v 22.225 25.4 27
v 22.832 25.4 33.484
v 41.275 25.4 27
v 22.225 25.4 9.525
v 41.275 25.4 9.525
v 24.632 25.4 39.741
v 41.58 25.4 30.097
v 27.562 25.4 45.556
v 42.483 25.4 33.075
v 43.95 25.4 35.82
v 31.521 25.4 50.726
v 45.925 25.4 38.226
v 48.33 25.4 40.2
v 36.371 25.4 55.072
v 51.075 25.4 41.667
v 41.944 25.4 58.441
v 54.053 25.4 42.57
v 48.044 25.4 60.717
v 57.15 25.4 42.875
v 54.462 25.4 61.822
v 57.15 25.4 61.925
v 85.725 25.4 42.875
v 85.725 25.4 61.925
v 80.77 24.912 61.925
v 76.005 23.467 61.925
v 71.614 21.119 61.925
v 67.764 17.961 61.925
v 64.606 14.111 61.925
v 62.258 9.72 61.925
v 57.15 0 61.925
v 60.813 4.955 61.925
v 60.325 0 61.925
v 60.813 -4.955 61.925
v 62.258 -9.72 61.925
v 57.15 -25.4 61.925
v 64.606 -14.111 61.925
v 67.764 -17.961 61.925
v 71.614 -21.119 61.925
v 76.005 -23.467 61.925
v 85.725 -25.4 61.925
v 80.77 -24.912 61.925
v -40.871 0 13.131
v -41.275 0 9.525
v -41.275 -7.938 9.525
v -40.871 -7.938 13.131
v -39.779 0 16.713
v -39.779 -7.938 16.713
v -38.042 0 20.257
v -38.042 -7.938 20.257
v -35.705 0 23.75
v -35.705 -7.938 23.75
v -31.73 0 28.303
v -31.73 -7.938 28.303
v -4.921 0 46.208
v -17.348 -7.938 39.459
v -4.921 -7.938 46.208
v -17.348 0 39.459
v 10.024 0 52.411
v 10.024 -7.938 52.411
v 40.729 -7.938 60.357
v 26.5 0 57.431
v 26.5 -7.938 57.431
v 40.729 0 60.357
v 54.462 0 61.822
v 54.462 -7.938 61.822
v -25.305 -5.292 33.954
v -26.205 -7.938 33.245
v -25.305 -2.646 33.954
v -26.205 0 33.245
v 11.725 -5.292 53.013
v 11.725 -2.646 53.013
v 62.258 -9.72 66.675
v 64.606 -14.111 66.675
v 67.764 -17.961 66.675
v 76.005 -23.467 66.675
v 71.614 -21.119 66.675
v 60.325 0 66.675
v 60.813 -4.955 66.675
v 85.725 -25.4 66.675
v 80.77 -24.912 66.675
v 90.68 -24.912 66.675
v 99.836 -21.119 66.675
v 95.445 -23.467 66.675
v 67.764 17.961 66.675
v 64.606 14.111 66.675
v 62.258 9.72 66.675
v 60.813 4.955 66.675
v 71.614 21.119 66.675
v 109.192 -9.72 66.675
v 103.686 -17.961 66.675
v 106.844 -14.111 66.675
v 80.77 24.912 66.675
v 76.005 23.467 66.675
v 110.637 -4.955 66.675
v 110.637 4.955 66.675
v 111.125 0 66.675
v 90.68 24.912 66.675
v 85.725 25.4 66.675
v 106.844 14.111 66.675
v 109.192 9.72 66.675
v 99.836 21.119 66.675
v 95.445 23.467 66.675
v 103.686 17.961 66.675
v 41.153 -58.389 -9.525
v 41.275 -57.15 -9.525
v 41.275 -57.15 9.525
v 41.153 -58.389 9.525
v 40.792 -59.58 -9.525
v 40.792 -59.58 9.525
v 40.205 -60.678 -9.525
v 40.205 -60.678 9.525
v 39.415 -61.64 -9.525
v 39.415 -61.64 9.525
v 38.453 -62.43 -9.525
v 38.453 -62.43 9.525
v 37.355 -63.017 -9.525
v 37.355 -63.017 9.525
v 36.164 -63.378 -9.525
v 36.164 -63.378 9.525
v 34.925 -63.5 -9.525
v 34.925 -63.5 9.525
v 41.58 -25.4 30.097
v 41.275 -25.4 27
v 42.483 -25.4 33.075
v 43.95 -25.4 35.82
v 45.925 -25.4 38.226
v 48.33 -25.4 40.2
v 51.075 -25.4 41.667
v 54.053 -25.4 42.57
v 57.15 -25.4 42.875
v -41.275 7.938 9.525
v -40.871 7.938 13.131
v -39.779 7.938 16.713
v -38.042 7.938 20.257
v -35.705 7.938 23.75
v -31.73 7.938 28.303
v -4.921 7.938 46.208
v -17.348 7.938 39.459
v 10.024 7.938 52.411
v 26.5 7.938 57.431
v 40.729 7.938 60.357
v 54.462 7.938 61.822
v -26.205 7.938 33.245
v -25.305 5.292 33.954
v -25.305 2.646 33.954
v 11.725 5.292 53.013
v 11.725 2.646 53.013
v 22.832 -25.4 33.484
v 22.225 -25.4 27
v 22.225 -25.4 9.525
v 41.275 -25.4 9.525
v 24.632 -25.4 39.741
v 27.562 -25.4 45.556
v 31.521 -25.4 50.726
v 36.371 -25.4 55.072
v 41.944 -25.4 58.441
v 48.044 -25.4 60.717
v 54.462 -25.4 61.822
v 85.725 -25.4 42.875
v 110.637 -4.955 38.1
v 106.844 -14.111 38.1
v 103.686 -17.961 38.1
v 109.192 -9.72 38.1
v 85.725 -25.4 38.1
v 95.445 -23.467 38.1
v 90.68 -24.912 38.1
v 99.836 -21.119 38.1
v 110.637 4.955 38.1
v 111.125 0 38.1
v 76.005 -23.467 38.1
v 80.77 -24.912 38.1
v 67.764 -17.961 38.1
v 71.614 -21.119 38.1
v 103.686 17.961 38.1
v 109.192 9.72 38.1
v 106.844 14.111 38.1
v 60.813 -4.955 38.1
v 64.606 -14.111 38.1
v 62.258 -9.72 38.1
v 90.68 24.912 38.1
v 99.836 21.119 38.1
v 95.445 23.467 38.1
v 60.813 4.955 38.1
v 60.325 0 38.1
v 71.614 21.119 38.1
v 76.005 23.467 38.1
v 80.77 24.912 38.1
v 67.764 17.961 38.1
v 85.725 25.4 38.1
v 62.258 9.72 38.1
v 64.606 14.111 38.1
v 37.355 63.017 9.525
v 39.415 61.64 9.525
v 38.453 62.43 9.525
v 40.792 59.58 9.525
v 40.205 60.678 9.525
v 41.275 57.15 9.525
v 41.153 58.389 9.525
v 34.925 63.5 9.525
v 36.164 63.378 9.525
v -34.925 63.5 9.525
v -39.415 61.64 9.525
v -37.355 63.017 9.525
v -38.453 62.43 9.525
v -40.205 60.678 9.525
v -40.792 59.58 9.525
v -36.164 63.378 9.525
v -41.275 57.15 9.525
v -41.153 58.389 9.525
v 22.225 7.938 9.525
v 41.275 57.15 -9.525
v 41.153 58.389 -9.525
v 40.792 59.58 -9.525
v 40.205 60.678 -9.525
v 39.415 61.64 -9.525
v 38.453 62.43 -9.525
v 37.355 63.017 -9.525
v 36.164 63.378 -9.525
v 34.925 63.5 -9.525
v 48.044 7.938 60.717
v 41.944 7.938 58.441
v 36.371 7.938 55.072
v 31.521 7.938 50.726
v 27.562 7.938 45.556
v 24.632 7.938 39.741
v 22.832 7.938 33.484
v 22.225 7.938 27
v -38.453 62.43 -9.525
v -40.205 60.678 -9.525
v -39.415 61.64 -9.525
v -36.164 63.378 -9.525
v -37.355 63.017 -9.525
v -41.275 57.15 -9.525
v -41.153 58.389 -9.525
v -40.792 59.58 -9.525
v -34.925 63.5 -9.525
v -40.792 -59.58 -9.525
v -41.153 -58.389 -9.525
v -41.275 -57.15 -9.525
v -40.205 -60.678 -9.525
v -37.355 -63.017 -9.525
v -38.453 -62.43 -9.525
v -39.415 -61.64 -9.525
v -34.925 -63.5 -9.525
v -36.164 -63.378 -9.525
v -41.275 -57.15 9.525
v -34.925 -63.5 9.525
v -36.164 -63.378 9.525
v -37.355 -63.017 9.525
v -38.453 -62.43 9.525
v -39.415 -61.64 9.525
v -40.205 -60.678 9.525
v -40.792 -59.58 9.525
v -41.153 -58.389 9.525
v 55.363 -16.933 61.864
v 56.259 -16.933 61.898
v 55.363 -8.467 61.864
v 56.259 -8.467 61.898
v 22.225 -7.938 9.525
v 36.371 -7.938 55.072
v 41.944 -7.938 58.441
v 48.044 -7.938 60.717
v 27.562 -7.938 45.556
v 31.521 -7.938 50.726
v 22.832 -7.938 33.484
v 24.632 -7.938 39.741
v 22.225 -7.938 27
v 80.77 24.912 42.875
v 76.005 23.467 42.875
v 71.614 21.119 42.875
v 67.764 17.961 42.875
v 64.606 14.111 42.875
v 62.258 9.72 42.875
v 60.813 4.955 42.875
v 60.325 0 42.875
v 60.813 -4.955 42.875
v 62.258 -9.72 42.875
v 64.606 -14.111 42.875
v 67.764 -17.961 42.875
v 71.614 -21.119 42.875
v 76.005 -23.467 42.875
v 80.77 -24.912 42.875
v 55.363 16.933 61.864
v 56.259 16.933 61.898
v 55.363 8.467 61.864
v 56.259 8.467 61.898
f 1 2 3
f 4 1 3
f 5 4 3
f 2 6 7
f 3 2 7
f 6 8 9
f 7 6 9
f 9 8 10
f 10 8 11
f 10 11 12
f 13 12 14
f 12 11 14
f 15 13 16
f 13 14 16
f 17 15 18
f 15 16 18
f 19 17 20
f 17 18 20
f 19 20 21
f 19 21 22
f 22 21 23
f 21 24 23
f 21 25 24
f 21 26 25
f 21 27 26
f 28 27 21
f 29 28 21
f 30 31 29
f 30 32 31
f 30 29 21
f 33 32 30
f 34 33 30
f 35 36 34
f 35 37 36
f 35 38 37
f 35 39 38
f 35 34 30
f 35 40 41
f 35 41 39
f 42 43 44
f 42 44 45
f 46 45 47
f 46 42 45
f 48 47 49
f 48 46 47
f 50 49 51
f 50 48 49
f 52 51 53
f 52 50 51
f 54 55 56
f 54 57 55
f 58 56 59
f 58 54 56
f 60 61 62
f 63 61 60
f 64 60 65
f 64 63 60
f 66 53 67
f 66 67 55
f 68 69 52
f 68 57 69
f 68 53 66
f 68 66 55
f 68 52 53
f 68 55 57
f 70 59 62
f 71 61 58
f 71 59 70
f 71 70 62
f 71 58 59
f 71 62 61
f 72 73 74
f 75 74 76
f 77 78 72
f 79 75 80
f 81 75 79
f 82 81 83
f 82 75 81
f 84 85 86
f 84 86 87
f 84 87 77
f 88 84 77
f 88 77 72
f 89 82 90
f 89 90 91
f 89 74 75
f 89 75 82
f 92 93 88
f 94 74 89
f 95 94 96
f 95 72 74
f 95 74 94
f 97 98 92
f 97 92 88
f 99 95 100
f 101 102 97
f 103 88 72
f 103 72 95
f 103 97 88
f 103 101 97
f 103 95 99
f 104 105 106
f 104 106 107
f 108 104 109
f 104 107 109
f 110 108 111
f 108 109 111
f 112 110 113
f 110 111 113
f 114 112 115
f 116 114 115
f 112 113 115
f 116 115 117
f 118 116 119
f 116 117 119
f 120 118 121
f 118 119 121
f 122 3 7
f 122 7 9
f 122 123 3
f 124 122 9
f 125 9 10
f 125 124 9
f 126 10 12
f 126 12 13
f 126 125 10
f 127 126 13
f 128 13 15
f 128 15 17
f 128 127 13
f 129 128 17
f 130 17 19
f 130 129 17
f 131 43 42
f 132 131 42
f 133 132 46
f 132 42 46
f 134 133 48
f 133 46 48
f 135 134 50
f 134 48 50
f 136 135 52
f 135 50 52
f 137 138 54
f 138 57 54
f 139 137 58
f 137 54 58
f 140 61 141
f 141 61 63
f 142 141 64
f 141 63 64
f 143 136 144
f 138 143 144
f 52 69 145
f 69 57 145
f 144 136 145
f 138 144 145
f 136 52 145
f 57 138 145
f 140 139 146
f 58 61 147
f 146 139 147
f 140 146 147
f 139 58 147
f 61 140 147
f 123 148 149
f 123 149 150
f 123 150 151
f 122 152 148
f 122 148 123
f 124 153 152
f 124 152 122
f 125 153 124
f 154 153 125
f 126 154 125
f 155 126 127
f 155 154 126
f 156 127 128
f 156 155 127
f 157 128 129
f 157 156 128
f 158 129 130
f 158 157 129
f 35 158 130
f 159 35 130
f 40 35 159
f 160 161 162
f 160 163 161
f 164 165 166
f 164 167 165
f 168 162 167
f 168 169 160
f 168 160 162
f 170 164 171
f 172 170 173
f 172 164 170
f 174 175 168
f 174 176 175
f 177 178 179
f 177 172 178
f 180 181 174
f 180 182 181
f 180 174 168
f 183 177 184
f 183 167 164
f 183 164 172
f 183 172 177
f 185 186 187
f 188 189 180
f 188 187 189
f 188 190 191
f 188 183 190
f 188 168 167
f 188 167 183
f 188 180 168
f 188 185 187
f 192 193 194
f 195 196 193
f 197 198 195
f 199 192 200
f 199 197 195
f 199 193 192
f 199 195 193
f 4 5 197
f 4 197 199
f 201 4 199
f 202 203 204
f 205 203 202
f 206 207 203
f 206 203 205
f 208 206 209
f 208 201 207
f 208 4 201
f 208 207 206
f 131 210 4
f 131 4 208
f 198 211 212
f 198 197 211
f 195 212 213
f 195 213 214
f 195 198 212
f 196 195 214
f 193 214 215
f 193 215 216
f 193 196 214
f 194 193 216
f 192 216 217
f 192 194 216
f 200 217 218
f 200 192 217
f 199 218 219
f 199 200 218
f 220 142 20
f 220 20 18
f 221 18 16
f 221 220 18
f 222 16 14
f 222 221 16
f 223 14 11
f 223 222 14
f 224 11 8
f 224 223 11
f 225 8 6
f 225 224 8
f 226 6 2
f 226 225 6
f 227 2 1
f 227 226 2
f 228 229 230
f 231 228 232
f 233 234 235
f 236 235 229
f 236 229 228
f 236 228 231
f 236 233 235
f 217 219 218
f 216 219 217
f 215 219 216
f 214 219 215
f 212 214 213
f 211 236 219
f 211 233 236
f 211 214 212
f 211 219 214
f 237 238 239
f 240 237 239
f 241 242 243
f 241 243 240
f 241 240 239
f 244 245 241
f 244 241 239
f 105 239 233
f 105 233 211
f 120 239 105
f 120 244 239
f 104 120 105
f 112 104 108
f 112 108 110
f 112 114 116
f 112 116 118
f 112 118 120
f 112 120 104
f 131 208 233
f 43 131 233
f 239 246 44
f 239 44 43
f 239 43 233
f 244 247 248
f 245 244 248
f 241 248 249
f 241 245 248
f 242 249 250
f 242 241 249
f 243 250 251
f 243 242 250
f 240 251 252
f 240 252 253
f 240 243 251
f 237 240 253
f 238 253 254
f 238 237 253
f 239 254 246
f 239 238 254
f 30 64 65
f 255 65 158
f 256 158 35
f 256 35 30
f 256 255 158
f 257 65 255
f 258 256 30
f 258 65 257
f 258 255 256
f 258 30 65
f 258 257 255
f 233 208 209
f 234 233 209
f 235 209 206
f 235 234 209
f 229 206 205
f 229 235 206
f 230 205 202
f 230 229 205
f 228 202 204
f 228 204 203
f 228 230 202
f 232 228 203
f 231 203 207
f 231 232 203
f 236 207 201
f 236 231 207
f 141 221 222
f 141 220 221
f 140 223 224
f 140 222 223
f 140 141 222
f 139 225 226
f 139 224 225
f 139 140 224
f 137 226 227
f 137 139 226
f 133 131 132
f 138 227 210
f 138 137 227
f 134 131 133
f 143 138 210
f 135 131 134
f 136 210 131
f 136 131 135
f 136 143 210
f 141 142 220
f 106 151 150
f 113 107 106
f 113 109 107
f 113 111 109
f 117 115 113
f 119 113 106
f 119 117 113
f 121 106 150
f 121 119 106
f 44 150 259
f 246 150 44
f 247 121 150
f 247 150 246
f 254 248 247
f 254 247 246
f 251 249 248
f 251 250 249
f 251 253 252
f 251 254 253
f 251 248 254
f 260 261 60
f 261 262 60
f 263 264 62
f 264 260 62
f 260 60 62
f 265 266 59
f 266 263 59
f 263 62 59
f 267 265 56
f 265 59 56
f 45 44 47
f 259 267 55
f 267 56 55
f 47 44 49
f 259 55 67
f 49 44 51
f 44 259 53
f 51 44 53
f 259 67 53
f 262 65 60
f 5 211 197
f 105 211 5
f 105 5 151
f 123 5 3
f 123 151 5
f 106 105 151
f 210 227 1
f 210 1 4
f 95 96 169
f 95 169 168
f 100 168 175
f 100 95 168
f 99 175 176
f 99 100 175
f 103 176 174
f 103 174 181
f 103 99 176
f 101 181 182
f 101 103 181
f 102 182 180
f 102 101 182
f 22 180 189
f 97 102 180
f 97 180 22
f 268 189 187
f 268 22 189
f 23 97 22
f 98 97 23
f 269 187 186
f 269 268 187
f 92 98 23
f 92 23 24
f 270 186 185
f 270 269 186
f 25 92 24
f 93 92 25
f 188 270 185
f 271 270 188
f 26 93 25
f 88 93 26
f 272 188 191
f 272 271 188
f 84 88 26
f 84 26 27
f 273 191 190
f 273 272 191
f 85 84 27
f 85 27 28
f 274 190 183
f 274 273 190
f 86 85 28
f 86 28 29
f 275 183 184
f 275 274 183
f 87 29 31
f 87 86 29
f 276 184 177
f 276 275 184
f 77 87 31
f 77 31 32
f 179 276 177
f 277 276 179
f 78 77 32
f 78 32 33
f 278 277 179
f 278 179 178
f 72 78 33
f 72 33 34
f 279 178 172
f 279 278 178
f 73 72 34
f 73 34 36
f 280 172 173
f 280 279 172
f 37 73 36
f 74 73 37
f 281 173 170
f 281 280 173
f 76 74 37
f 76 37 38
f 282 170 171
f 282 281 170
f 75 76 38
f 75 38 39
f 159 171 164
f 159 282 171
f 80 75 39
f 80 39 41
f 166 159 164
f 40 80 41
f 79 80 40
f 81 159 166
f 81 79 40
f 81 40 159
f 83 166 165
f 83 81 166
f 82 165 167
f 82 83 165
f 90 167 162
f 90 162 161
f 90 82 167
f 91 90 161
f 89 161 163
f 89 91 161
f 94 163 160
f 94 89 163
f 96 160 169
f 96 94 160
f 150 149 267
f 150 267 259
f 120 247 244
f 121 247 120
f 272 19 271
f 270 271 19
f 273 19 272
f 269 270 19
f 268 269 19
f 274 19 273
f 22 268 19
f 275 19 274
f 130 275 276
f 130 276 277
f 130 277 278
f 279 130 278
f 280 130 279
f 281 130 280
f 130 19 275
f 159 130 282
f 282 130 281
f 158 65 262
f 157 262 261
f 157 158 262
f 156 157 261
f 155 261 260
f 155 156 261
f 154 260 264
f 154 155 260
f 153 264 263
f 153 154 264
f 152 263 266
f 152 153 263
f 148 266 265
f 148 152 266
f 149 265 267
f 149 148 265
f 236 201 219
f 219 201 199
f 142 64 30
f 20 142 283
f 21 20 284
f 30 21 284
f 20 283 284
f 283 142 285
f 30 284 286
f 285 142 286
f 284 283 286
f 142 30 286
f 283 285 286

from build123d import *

# Parameters (mm, degrees)
F1_DEPTH = 63.5
F0_W     = 25.4
F0_H     = 19.05
F2_DEPTH = 25.4
F3_DEPTH = 7.9375
F5_R     = 6.35


with BuildPart() as f1:
    # F0 (on Front) → F1 (new body, symmetric)
    with BuildSketch(Plane.XZ):
        Polygon((-41.275, 9.525), (-41.275, -9.525), (41.275, -9.525), (41.275, 9.525), (22.225, 9.525), align=None)
    extrude(amount=F1_DEPTH, both=True)

    # F0 (on Front) → F2 (join, symmetric)
    with BuildSketch(Plane.XZ):
        with Locations((73.025, 52.4002)):
            Rectangle(F0_W, F0_H)
        with BuildLine():
            Line((22.225, 9.525), (41.275, 9.525))
            Line((41.275, 9.525), (41.275, 27.0002))
            ThreePointArc((41.275, 27.0002), (45.9246798487, 38.2255201513), (57.15, 42.8752))
            Line((57.15, 42.8752), (60.325, 42.8752))
            Line((60.325, 42.8752), (60.325, 61.9252))
            Line((60.325, 61.9252), (57.15, 61.9252))
            add(Edge.make_bspline(
                [(54.4617401278, 61.8215854385), (55.3652962771, 61.8675171828), (56.2616391895, 61.9021368307), (57.15, 61.9252)],
                knots=[109.0694907263, 109.0694907263, 109.0694907263, 109.0694907263, 111.5045361635, 111.5045361635, 111.5045361635, 111.5045361635], degree=3))
            ThreePointArc((54.4617401278, 61.8215854385), (31.5214699891, 50.7264317801), (22.225, 27.0002))
            Line((22.225, 27.0002), (22.225, 9.525))
        make_face()
    extrude(amount=F2_DEPTH, both=True)

    # F0 (on Front) → F3 (join, symmetric)
    with BuildSketch(Plane.XZ):
        with BuildLine():
            add(Edge.make_bspline(
                [(-41.275, 9.525), (-40.9534464322, 35.0115971257), (13.9900480858, 59.7642308284), (54.4617401278, 61.8215854385)],
                knots=[0, 0, 0, 0, 109.0694907263, 109.0694907263, 109.0694907263, 109.0694907263], degree=3))
            Line((-41.275, 9.525), (22.225, 9.525))
            Line((22.225, 9.525), (22.225, 27.0002))
            ThreePointArc((22.225, 27.0002), (31.5214699891, 50.7264317801), (54.4617401278, 61.8215854385))
        make_face()
    extrude(amount=F3_DEPTH, both=True)

    # F0 (on Front) → F4 (revolve)
    with BuildSketch(Plane.XZ):
        Polygon((85.725, 66.675), (85.725, 61.9252), (85.725, 42.8752), (85.725, 38.1), (111.125, 38.1), (111.125, 66.675), align=None)
    revolve(axis=Axis((85.725, 0, 52.3875), (0, 0, 1)))

    # F5
    f5_edges = [f1.edges().sort_by_distance(p)[0] for p in [
        (41.275, -63.5, 0),
        (-41.275, -63.5, 0),
        (-41.275, 63.5, 0),
        (41.275, 63.5, 0),
    ]]
    fillet(f5_edges, radius=F5_R)


solid = f1.part
